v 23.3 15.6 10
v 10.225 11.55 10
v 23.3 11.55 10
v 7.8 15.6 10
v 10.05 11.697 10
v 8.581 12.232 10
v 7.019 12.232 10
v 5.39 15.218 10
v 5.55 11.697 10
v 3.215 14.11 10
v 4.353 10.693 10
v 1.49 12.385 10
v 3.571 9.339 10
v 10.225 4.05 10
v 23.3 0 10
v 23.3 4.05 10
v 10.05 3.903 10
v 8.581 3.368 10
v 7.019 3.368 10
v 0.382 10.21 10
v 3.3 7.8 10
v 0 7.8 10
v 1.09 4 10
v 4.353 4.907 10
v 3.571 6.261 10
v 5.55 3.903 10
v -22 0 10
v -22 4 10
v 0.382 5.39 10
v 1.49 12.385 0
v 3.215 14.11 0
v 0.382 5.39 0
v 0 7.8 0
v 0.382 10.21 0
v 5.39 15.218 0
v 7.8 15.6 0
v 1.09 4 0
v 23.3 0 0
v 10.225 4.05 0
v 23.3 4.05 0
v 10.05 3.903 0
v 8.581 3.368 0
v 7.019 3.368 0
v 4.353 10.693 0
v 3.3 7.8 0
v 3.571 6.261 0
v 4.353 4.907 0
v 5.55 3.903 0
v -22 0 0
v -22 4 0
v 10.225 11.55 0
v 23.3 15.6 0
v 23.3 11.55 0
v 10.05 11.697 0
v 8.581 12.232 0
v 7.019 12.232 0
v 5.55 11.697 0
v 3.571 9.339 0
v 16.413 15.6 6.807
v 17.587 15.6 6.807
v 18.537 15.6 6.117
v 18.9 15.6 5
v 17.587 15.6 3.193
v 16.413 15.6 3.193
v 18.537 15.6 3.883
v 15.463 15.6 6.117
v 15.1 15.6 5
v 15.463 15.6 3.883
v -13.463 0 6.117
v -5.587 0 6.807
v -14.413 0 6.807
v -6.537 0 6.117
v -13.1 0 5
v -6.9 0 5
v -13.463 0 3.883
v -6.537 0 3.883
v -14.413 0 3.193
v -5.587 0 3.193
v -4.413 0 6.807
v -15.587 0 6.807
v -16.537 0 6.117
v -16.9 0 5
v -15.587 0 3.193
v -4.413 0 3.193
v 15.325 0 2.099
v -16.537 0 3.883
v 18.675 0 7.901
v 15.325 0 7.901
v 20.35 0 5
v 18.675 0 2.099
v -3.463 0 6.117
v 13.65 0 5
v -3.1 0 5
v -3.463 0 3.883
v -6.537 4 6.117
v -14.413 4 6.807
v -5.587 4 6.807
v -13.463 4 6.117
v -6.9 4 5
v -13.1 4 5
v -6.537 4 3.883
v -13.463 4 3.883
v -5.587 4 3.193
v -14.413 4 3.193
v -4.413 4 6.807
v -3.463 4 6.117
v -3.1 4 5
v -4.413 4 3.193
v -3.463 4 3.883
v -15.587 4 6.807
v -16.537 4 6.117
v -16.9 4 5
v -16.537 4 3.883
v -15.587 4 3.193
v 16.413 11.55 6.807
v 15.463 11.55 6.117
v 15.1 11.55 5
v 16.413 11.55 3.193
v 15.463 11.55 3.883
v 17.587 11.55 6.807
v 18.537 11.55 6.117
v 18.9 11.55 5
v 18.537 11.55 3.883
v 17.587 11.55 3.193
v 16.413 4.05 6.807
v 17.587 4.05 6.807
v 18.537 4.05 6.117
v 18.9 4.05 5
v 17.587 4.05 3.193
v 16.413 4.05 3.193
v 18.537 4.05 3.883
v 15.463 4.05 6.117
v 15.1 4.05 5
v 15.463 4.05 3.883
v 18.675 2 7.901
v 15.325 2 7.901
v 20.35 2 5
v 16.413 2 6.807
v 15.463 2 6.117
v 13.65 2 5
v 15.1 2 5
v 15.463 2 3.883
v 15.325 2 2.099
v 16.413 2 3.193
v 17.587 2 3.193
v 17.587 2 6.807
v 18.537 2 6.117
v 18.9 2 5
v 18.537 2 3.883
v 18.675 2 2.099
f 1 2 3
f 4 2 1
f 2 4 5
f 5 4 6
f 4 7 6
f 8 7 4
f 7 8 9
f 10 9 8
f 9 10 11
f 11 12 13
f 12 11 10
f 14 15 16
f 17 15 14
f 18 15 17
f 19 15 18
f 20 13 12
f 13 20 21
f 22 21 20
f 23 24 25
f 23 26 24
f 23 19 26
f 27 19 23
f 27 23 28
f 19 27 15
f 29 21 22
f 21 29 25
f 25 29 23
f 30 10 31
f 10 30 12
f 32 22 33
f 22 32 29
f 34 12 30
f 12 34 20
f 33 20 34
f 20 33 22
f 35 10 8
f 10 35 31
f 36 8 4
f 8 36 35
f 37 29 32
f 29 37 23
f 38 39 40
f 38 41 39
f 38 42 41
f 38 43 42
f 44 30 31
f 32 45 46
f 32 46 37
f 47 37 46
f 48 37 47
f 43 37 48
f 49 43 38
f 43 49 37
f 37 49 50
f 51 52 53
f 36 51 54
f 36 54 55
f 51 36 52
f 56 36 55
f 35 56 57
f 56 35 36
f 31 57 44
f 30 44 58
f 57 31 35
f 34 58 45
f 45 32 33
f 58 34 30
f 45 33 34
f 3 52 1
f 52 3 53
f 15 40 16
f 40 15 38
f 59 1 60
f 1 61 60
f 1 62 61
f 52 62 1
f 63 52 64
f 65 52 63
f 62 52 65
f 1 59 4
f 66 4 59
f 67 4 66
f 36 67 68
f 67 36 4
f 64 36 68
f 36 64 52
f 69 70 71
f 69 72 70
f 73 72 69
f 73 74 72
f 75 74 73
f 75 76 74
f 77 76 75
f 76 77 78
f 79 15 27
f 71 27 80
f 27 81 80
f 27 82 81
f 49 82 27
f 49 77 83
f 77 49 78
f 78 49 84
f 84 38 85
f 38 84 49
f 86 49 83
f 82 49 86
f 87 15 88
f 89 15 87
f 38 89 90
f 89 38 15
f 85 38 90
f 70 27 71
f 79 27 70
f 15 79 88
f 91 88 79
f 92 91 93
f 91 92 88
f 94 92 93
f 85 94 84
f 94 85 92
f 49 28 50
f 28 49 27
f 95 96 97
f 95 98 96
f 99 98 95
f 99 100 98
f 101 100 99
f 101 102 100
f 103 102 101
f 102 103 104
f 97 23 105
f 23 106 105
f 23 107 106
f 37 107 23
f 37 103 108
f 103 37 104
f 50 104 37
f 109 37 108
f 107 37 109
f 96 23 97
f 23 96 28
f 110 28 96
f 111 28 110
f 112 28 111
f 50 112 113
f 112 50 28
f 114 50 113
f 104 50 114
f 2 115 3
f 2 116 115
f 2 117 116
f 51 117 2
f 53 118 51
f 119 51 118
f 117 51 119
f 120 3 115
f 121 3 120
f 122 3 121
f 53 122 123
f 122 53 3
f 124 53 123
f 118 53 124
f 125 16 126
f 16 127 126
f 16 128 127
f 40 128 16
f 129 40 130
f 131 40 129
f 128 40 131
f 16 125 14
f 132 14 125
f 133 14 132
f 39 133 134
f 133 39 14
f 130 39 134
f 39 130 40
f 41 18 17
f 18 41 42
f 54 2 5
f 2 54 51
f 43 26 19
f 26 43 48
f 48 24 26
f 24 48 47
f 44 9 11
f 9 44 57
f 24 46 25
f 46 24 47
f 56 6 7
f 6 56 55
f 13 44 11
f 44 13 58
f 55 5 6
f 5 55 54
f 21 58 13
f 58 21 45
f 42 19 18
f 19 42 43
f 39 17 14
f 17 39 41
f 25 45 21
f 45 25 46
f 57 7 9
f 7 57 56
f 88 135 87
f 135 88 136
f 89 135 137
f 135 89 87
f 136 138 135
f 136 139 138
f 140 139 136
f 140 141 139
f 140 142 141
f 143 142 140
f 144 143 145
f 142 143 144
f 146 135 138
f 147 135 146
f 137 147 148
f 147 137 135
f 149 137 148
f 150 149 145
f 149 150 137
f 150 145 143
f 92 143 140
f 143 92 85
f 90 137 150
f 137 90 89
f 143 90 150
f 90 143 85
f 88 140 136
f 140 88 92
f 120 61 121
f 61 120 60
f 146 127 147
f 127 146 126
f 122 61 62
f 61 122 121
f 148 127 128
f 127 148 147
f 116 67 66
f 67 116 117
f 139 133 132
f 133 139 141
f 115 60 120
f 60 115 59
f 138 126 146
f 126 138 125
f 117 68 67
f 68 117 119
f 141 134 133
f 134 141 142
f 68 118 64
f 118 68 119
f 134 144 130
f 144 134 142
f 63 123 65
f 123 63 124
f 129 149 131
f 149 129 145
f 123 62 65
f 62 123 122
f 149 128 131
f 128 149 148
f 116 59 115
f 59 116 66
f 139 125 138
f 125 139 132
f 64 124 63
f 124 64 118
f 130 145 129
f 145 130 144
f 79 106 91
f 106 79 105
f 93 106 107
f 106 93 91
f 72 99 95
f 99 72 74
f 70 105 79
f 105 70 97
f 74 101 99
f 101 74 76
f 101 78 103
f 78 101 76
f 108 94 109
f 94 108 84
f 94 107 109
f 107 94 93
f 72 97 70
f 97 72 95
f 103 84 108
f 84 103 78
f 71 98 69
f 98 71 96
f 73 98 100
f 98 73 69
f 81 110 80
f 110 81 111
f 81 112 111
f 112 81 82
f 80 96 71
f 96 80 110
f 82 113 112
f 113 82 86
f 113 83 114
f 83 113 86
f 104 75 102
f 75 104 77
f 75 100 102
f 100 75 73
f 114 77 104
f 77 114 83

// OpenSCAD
// file: configuration2.scad
// PRUSA Mendel  
// Configuration file
// GNU GPL v2
// Josef Průša
// josefprusa@me.com
// prusadjs.cz
// http://www.reprap.org/wiki/Prusa_Mendel
// http://github.com/prusajr/PrusaMendel

// PLEASE SELECT ONE OF THE CONFIGURATIONS BELOW
// BY UN-COMMENTING IT

variant=0; //0 for metric
//variant=1; //1 for SAE
if(variant==0){
echo("variant: metric");
}else if(variant==1){
echo("variant: sae");
} else{
echo("WARNING: INVALID CONFIGURATION");
}


vars=[
//[m8_dia, m8_nut, m4_dia, m4_nut, m3_dia, m3_nut, bush_dia, mot_shaft, bush_rod, bush_outerdia, bush_length]
[9,16,4.5,9.3,3.8,6.7,11,5.3,8,16,11],//metric M8 was 15.8
[9,15.4,4.5,9.3,4.5,9.3,11.5,5.3,7.9375,16,11]//SAE
];

//BUSHING TYPE Can generate three versions
// 1 - regular old ones
// 2 - helical ones
// 3 - holders for brass or any other bought bushings
bushing_type = 2;

//Round corner diameter
round_corner_diameter = 8;

//Thin wall size
layer_height = 0.4;
perimeter_width_over_thicknes = 1.6;
infill_widht_over_thickness = 1.55;
thin_wall = 2*(perimeter_width_over_thicknes*layer_height+infill_widht_over_thickness*layer_height);
if(thin_wall<2){
	echo("Check thin wall size, its below 2mm!");
}
echo(thin_wall);

//DO NOT TOUCH THIS SECTION!
m8_diameter = vars[variant][0];
m8_nut_diameter = vars[variant][1];
m4_diameter = vars[variant][2];
m4_nut_diameter = vars[variant][3];
m3_diameter = vars[variant][4];
m3_nut_diameter = vars[variant][5];
bushing_diameter = vars[variant][6];
motor_shaft=vars[variant][7];
bushing_rodsize = vars[variant][8];
bushing_outerDiameter = vars[variant][9];
bushing_lenght = vars[variant][10];


// MINI-HUXLEY VERSION (TODO, just place holder)
// include <configuration-huxley.scad>

// MEGA VERSION (TODO, just place holder)
// include <configuration-mega.scad>


// Some basic functions, probably should be somewhere else
module roundcorner(diameter){
	difference(){
		cube(size = [diameter,diameter,99], center = false);
		translate(v = [diameter, diameter, 0]) cylinder(h = 100, r=diameter, center=true);
	}
}
// main file
// PLASTIBOT MENDEL
// Endstop Holder
// Added nuttrap for clamping screw
// Plastibot <support@plastibot.com>
// Derived from: 


// PRUSA Mendel  
// Endstop holder
// Used to attach endstops to 8mm rods
// GNU GPL v2
// Josef Průša
// josefprusa@me.com
// prusadjs.cz
// http://www.reprap.org/wiki/Prusa_Mendel
// http://github.com/prusajr/PrusaMendel

include <configuration2.scad>

/**
 * @id endstop-holder
 * @name Endstop holder
 * @category Printed
 * @using 1 m3x20
 * @using 1 m3nut
 * @using 2 m3washer
 */
module endstop(){
outer_diameter = m8_diameter/2+3.3;
screw_hole_spacing = 10;
opening_size = m8_diameter-1.5; //openingsize

difference(){
	union(){


		translate([outer_diameter, outer_diameter, 0]) cylinder(h =10, r = outer_diameter, $fn = 20);
		translate([outer_diameter, 0, 0]) cube([15.5,outer_diameter*2,10]);
		translate([-22, 0, 0]) cube([30, 4, 10]);
		//translate([-10, 0, 0]) cube([10, 4, 25]);
	}




	translate([9, outer_diameter-opening_size/2, 0]) cube([18,opening_size,20]);
	translate([outer_diameter, outer_diameter, 0]) cylinder(h =20, r = m8_diameter/2, $fn = 18);
	translate([17, 2, 5]) rotate([90, 0, 0]) cylinder(h =2.5, r = m3_nut_diameter/2, $fn = 6);
	translate([17, 17, 5]) rotate([90, 0, 0]) cylinder(h =20, r = m3_diameter/2, $fn = 10);
	translate([-5, 17, 5]) rotate([90, 0, 0]) cylinder(h =20, r = m3_diameter/2, $fn = 10);
	translate([-(5+screw_hole_spacing), 17, 5]) rotate([90, 0, 0]) cylinder(h =20, r = m3_diameter/2, $fn = 10);
}
}
endstop();
